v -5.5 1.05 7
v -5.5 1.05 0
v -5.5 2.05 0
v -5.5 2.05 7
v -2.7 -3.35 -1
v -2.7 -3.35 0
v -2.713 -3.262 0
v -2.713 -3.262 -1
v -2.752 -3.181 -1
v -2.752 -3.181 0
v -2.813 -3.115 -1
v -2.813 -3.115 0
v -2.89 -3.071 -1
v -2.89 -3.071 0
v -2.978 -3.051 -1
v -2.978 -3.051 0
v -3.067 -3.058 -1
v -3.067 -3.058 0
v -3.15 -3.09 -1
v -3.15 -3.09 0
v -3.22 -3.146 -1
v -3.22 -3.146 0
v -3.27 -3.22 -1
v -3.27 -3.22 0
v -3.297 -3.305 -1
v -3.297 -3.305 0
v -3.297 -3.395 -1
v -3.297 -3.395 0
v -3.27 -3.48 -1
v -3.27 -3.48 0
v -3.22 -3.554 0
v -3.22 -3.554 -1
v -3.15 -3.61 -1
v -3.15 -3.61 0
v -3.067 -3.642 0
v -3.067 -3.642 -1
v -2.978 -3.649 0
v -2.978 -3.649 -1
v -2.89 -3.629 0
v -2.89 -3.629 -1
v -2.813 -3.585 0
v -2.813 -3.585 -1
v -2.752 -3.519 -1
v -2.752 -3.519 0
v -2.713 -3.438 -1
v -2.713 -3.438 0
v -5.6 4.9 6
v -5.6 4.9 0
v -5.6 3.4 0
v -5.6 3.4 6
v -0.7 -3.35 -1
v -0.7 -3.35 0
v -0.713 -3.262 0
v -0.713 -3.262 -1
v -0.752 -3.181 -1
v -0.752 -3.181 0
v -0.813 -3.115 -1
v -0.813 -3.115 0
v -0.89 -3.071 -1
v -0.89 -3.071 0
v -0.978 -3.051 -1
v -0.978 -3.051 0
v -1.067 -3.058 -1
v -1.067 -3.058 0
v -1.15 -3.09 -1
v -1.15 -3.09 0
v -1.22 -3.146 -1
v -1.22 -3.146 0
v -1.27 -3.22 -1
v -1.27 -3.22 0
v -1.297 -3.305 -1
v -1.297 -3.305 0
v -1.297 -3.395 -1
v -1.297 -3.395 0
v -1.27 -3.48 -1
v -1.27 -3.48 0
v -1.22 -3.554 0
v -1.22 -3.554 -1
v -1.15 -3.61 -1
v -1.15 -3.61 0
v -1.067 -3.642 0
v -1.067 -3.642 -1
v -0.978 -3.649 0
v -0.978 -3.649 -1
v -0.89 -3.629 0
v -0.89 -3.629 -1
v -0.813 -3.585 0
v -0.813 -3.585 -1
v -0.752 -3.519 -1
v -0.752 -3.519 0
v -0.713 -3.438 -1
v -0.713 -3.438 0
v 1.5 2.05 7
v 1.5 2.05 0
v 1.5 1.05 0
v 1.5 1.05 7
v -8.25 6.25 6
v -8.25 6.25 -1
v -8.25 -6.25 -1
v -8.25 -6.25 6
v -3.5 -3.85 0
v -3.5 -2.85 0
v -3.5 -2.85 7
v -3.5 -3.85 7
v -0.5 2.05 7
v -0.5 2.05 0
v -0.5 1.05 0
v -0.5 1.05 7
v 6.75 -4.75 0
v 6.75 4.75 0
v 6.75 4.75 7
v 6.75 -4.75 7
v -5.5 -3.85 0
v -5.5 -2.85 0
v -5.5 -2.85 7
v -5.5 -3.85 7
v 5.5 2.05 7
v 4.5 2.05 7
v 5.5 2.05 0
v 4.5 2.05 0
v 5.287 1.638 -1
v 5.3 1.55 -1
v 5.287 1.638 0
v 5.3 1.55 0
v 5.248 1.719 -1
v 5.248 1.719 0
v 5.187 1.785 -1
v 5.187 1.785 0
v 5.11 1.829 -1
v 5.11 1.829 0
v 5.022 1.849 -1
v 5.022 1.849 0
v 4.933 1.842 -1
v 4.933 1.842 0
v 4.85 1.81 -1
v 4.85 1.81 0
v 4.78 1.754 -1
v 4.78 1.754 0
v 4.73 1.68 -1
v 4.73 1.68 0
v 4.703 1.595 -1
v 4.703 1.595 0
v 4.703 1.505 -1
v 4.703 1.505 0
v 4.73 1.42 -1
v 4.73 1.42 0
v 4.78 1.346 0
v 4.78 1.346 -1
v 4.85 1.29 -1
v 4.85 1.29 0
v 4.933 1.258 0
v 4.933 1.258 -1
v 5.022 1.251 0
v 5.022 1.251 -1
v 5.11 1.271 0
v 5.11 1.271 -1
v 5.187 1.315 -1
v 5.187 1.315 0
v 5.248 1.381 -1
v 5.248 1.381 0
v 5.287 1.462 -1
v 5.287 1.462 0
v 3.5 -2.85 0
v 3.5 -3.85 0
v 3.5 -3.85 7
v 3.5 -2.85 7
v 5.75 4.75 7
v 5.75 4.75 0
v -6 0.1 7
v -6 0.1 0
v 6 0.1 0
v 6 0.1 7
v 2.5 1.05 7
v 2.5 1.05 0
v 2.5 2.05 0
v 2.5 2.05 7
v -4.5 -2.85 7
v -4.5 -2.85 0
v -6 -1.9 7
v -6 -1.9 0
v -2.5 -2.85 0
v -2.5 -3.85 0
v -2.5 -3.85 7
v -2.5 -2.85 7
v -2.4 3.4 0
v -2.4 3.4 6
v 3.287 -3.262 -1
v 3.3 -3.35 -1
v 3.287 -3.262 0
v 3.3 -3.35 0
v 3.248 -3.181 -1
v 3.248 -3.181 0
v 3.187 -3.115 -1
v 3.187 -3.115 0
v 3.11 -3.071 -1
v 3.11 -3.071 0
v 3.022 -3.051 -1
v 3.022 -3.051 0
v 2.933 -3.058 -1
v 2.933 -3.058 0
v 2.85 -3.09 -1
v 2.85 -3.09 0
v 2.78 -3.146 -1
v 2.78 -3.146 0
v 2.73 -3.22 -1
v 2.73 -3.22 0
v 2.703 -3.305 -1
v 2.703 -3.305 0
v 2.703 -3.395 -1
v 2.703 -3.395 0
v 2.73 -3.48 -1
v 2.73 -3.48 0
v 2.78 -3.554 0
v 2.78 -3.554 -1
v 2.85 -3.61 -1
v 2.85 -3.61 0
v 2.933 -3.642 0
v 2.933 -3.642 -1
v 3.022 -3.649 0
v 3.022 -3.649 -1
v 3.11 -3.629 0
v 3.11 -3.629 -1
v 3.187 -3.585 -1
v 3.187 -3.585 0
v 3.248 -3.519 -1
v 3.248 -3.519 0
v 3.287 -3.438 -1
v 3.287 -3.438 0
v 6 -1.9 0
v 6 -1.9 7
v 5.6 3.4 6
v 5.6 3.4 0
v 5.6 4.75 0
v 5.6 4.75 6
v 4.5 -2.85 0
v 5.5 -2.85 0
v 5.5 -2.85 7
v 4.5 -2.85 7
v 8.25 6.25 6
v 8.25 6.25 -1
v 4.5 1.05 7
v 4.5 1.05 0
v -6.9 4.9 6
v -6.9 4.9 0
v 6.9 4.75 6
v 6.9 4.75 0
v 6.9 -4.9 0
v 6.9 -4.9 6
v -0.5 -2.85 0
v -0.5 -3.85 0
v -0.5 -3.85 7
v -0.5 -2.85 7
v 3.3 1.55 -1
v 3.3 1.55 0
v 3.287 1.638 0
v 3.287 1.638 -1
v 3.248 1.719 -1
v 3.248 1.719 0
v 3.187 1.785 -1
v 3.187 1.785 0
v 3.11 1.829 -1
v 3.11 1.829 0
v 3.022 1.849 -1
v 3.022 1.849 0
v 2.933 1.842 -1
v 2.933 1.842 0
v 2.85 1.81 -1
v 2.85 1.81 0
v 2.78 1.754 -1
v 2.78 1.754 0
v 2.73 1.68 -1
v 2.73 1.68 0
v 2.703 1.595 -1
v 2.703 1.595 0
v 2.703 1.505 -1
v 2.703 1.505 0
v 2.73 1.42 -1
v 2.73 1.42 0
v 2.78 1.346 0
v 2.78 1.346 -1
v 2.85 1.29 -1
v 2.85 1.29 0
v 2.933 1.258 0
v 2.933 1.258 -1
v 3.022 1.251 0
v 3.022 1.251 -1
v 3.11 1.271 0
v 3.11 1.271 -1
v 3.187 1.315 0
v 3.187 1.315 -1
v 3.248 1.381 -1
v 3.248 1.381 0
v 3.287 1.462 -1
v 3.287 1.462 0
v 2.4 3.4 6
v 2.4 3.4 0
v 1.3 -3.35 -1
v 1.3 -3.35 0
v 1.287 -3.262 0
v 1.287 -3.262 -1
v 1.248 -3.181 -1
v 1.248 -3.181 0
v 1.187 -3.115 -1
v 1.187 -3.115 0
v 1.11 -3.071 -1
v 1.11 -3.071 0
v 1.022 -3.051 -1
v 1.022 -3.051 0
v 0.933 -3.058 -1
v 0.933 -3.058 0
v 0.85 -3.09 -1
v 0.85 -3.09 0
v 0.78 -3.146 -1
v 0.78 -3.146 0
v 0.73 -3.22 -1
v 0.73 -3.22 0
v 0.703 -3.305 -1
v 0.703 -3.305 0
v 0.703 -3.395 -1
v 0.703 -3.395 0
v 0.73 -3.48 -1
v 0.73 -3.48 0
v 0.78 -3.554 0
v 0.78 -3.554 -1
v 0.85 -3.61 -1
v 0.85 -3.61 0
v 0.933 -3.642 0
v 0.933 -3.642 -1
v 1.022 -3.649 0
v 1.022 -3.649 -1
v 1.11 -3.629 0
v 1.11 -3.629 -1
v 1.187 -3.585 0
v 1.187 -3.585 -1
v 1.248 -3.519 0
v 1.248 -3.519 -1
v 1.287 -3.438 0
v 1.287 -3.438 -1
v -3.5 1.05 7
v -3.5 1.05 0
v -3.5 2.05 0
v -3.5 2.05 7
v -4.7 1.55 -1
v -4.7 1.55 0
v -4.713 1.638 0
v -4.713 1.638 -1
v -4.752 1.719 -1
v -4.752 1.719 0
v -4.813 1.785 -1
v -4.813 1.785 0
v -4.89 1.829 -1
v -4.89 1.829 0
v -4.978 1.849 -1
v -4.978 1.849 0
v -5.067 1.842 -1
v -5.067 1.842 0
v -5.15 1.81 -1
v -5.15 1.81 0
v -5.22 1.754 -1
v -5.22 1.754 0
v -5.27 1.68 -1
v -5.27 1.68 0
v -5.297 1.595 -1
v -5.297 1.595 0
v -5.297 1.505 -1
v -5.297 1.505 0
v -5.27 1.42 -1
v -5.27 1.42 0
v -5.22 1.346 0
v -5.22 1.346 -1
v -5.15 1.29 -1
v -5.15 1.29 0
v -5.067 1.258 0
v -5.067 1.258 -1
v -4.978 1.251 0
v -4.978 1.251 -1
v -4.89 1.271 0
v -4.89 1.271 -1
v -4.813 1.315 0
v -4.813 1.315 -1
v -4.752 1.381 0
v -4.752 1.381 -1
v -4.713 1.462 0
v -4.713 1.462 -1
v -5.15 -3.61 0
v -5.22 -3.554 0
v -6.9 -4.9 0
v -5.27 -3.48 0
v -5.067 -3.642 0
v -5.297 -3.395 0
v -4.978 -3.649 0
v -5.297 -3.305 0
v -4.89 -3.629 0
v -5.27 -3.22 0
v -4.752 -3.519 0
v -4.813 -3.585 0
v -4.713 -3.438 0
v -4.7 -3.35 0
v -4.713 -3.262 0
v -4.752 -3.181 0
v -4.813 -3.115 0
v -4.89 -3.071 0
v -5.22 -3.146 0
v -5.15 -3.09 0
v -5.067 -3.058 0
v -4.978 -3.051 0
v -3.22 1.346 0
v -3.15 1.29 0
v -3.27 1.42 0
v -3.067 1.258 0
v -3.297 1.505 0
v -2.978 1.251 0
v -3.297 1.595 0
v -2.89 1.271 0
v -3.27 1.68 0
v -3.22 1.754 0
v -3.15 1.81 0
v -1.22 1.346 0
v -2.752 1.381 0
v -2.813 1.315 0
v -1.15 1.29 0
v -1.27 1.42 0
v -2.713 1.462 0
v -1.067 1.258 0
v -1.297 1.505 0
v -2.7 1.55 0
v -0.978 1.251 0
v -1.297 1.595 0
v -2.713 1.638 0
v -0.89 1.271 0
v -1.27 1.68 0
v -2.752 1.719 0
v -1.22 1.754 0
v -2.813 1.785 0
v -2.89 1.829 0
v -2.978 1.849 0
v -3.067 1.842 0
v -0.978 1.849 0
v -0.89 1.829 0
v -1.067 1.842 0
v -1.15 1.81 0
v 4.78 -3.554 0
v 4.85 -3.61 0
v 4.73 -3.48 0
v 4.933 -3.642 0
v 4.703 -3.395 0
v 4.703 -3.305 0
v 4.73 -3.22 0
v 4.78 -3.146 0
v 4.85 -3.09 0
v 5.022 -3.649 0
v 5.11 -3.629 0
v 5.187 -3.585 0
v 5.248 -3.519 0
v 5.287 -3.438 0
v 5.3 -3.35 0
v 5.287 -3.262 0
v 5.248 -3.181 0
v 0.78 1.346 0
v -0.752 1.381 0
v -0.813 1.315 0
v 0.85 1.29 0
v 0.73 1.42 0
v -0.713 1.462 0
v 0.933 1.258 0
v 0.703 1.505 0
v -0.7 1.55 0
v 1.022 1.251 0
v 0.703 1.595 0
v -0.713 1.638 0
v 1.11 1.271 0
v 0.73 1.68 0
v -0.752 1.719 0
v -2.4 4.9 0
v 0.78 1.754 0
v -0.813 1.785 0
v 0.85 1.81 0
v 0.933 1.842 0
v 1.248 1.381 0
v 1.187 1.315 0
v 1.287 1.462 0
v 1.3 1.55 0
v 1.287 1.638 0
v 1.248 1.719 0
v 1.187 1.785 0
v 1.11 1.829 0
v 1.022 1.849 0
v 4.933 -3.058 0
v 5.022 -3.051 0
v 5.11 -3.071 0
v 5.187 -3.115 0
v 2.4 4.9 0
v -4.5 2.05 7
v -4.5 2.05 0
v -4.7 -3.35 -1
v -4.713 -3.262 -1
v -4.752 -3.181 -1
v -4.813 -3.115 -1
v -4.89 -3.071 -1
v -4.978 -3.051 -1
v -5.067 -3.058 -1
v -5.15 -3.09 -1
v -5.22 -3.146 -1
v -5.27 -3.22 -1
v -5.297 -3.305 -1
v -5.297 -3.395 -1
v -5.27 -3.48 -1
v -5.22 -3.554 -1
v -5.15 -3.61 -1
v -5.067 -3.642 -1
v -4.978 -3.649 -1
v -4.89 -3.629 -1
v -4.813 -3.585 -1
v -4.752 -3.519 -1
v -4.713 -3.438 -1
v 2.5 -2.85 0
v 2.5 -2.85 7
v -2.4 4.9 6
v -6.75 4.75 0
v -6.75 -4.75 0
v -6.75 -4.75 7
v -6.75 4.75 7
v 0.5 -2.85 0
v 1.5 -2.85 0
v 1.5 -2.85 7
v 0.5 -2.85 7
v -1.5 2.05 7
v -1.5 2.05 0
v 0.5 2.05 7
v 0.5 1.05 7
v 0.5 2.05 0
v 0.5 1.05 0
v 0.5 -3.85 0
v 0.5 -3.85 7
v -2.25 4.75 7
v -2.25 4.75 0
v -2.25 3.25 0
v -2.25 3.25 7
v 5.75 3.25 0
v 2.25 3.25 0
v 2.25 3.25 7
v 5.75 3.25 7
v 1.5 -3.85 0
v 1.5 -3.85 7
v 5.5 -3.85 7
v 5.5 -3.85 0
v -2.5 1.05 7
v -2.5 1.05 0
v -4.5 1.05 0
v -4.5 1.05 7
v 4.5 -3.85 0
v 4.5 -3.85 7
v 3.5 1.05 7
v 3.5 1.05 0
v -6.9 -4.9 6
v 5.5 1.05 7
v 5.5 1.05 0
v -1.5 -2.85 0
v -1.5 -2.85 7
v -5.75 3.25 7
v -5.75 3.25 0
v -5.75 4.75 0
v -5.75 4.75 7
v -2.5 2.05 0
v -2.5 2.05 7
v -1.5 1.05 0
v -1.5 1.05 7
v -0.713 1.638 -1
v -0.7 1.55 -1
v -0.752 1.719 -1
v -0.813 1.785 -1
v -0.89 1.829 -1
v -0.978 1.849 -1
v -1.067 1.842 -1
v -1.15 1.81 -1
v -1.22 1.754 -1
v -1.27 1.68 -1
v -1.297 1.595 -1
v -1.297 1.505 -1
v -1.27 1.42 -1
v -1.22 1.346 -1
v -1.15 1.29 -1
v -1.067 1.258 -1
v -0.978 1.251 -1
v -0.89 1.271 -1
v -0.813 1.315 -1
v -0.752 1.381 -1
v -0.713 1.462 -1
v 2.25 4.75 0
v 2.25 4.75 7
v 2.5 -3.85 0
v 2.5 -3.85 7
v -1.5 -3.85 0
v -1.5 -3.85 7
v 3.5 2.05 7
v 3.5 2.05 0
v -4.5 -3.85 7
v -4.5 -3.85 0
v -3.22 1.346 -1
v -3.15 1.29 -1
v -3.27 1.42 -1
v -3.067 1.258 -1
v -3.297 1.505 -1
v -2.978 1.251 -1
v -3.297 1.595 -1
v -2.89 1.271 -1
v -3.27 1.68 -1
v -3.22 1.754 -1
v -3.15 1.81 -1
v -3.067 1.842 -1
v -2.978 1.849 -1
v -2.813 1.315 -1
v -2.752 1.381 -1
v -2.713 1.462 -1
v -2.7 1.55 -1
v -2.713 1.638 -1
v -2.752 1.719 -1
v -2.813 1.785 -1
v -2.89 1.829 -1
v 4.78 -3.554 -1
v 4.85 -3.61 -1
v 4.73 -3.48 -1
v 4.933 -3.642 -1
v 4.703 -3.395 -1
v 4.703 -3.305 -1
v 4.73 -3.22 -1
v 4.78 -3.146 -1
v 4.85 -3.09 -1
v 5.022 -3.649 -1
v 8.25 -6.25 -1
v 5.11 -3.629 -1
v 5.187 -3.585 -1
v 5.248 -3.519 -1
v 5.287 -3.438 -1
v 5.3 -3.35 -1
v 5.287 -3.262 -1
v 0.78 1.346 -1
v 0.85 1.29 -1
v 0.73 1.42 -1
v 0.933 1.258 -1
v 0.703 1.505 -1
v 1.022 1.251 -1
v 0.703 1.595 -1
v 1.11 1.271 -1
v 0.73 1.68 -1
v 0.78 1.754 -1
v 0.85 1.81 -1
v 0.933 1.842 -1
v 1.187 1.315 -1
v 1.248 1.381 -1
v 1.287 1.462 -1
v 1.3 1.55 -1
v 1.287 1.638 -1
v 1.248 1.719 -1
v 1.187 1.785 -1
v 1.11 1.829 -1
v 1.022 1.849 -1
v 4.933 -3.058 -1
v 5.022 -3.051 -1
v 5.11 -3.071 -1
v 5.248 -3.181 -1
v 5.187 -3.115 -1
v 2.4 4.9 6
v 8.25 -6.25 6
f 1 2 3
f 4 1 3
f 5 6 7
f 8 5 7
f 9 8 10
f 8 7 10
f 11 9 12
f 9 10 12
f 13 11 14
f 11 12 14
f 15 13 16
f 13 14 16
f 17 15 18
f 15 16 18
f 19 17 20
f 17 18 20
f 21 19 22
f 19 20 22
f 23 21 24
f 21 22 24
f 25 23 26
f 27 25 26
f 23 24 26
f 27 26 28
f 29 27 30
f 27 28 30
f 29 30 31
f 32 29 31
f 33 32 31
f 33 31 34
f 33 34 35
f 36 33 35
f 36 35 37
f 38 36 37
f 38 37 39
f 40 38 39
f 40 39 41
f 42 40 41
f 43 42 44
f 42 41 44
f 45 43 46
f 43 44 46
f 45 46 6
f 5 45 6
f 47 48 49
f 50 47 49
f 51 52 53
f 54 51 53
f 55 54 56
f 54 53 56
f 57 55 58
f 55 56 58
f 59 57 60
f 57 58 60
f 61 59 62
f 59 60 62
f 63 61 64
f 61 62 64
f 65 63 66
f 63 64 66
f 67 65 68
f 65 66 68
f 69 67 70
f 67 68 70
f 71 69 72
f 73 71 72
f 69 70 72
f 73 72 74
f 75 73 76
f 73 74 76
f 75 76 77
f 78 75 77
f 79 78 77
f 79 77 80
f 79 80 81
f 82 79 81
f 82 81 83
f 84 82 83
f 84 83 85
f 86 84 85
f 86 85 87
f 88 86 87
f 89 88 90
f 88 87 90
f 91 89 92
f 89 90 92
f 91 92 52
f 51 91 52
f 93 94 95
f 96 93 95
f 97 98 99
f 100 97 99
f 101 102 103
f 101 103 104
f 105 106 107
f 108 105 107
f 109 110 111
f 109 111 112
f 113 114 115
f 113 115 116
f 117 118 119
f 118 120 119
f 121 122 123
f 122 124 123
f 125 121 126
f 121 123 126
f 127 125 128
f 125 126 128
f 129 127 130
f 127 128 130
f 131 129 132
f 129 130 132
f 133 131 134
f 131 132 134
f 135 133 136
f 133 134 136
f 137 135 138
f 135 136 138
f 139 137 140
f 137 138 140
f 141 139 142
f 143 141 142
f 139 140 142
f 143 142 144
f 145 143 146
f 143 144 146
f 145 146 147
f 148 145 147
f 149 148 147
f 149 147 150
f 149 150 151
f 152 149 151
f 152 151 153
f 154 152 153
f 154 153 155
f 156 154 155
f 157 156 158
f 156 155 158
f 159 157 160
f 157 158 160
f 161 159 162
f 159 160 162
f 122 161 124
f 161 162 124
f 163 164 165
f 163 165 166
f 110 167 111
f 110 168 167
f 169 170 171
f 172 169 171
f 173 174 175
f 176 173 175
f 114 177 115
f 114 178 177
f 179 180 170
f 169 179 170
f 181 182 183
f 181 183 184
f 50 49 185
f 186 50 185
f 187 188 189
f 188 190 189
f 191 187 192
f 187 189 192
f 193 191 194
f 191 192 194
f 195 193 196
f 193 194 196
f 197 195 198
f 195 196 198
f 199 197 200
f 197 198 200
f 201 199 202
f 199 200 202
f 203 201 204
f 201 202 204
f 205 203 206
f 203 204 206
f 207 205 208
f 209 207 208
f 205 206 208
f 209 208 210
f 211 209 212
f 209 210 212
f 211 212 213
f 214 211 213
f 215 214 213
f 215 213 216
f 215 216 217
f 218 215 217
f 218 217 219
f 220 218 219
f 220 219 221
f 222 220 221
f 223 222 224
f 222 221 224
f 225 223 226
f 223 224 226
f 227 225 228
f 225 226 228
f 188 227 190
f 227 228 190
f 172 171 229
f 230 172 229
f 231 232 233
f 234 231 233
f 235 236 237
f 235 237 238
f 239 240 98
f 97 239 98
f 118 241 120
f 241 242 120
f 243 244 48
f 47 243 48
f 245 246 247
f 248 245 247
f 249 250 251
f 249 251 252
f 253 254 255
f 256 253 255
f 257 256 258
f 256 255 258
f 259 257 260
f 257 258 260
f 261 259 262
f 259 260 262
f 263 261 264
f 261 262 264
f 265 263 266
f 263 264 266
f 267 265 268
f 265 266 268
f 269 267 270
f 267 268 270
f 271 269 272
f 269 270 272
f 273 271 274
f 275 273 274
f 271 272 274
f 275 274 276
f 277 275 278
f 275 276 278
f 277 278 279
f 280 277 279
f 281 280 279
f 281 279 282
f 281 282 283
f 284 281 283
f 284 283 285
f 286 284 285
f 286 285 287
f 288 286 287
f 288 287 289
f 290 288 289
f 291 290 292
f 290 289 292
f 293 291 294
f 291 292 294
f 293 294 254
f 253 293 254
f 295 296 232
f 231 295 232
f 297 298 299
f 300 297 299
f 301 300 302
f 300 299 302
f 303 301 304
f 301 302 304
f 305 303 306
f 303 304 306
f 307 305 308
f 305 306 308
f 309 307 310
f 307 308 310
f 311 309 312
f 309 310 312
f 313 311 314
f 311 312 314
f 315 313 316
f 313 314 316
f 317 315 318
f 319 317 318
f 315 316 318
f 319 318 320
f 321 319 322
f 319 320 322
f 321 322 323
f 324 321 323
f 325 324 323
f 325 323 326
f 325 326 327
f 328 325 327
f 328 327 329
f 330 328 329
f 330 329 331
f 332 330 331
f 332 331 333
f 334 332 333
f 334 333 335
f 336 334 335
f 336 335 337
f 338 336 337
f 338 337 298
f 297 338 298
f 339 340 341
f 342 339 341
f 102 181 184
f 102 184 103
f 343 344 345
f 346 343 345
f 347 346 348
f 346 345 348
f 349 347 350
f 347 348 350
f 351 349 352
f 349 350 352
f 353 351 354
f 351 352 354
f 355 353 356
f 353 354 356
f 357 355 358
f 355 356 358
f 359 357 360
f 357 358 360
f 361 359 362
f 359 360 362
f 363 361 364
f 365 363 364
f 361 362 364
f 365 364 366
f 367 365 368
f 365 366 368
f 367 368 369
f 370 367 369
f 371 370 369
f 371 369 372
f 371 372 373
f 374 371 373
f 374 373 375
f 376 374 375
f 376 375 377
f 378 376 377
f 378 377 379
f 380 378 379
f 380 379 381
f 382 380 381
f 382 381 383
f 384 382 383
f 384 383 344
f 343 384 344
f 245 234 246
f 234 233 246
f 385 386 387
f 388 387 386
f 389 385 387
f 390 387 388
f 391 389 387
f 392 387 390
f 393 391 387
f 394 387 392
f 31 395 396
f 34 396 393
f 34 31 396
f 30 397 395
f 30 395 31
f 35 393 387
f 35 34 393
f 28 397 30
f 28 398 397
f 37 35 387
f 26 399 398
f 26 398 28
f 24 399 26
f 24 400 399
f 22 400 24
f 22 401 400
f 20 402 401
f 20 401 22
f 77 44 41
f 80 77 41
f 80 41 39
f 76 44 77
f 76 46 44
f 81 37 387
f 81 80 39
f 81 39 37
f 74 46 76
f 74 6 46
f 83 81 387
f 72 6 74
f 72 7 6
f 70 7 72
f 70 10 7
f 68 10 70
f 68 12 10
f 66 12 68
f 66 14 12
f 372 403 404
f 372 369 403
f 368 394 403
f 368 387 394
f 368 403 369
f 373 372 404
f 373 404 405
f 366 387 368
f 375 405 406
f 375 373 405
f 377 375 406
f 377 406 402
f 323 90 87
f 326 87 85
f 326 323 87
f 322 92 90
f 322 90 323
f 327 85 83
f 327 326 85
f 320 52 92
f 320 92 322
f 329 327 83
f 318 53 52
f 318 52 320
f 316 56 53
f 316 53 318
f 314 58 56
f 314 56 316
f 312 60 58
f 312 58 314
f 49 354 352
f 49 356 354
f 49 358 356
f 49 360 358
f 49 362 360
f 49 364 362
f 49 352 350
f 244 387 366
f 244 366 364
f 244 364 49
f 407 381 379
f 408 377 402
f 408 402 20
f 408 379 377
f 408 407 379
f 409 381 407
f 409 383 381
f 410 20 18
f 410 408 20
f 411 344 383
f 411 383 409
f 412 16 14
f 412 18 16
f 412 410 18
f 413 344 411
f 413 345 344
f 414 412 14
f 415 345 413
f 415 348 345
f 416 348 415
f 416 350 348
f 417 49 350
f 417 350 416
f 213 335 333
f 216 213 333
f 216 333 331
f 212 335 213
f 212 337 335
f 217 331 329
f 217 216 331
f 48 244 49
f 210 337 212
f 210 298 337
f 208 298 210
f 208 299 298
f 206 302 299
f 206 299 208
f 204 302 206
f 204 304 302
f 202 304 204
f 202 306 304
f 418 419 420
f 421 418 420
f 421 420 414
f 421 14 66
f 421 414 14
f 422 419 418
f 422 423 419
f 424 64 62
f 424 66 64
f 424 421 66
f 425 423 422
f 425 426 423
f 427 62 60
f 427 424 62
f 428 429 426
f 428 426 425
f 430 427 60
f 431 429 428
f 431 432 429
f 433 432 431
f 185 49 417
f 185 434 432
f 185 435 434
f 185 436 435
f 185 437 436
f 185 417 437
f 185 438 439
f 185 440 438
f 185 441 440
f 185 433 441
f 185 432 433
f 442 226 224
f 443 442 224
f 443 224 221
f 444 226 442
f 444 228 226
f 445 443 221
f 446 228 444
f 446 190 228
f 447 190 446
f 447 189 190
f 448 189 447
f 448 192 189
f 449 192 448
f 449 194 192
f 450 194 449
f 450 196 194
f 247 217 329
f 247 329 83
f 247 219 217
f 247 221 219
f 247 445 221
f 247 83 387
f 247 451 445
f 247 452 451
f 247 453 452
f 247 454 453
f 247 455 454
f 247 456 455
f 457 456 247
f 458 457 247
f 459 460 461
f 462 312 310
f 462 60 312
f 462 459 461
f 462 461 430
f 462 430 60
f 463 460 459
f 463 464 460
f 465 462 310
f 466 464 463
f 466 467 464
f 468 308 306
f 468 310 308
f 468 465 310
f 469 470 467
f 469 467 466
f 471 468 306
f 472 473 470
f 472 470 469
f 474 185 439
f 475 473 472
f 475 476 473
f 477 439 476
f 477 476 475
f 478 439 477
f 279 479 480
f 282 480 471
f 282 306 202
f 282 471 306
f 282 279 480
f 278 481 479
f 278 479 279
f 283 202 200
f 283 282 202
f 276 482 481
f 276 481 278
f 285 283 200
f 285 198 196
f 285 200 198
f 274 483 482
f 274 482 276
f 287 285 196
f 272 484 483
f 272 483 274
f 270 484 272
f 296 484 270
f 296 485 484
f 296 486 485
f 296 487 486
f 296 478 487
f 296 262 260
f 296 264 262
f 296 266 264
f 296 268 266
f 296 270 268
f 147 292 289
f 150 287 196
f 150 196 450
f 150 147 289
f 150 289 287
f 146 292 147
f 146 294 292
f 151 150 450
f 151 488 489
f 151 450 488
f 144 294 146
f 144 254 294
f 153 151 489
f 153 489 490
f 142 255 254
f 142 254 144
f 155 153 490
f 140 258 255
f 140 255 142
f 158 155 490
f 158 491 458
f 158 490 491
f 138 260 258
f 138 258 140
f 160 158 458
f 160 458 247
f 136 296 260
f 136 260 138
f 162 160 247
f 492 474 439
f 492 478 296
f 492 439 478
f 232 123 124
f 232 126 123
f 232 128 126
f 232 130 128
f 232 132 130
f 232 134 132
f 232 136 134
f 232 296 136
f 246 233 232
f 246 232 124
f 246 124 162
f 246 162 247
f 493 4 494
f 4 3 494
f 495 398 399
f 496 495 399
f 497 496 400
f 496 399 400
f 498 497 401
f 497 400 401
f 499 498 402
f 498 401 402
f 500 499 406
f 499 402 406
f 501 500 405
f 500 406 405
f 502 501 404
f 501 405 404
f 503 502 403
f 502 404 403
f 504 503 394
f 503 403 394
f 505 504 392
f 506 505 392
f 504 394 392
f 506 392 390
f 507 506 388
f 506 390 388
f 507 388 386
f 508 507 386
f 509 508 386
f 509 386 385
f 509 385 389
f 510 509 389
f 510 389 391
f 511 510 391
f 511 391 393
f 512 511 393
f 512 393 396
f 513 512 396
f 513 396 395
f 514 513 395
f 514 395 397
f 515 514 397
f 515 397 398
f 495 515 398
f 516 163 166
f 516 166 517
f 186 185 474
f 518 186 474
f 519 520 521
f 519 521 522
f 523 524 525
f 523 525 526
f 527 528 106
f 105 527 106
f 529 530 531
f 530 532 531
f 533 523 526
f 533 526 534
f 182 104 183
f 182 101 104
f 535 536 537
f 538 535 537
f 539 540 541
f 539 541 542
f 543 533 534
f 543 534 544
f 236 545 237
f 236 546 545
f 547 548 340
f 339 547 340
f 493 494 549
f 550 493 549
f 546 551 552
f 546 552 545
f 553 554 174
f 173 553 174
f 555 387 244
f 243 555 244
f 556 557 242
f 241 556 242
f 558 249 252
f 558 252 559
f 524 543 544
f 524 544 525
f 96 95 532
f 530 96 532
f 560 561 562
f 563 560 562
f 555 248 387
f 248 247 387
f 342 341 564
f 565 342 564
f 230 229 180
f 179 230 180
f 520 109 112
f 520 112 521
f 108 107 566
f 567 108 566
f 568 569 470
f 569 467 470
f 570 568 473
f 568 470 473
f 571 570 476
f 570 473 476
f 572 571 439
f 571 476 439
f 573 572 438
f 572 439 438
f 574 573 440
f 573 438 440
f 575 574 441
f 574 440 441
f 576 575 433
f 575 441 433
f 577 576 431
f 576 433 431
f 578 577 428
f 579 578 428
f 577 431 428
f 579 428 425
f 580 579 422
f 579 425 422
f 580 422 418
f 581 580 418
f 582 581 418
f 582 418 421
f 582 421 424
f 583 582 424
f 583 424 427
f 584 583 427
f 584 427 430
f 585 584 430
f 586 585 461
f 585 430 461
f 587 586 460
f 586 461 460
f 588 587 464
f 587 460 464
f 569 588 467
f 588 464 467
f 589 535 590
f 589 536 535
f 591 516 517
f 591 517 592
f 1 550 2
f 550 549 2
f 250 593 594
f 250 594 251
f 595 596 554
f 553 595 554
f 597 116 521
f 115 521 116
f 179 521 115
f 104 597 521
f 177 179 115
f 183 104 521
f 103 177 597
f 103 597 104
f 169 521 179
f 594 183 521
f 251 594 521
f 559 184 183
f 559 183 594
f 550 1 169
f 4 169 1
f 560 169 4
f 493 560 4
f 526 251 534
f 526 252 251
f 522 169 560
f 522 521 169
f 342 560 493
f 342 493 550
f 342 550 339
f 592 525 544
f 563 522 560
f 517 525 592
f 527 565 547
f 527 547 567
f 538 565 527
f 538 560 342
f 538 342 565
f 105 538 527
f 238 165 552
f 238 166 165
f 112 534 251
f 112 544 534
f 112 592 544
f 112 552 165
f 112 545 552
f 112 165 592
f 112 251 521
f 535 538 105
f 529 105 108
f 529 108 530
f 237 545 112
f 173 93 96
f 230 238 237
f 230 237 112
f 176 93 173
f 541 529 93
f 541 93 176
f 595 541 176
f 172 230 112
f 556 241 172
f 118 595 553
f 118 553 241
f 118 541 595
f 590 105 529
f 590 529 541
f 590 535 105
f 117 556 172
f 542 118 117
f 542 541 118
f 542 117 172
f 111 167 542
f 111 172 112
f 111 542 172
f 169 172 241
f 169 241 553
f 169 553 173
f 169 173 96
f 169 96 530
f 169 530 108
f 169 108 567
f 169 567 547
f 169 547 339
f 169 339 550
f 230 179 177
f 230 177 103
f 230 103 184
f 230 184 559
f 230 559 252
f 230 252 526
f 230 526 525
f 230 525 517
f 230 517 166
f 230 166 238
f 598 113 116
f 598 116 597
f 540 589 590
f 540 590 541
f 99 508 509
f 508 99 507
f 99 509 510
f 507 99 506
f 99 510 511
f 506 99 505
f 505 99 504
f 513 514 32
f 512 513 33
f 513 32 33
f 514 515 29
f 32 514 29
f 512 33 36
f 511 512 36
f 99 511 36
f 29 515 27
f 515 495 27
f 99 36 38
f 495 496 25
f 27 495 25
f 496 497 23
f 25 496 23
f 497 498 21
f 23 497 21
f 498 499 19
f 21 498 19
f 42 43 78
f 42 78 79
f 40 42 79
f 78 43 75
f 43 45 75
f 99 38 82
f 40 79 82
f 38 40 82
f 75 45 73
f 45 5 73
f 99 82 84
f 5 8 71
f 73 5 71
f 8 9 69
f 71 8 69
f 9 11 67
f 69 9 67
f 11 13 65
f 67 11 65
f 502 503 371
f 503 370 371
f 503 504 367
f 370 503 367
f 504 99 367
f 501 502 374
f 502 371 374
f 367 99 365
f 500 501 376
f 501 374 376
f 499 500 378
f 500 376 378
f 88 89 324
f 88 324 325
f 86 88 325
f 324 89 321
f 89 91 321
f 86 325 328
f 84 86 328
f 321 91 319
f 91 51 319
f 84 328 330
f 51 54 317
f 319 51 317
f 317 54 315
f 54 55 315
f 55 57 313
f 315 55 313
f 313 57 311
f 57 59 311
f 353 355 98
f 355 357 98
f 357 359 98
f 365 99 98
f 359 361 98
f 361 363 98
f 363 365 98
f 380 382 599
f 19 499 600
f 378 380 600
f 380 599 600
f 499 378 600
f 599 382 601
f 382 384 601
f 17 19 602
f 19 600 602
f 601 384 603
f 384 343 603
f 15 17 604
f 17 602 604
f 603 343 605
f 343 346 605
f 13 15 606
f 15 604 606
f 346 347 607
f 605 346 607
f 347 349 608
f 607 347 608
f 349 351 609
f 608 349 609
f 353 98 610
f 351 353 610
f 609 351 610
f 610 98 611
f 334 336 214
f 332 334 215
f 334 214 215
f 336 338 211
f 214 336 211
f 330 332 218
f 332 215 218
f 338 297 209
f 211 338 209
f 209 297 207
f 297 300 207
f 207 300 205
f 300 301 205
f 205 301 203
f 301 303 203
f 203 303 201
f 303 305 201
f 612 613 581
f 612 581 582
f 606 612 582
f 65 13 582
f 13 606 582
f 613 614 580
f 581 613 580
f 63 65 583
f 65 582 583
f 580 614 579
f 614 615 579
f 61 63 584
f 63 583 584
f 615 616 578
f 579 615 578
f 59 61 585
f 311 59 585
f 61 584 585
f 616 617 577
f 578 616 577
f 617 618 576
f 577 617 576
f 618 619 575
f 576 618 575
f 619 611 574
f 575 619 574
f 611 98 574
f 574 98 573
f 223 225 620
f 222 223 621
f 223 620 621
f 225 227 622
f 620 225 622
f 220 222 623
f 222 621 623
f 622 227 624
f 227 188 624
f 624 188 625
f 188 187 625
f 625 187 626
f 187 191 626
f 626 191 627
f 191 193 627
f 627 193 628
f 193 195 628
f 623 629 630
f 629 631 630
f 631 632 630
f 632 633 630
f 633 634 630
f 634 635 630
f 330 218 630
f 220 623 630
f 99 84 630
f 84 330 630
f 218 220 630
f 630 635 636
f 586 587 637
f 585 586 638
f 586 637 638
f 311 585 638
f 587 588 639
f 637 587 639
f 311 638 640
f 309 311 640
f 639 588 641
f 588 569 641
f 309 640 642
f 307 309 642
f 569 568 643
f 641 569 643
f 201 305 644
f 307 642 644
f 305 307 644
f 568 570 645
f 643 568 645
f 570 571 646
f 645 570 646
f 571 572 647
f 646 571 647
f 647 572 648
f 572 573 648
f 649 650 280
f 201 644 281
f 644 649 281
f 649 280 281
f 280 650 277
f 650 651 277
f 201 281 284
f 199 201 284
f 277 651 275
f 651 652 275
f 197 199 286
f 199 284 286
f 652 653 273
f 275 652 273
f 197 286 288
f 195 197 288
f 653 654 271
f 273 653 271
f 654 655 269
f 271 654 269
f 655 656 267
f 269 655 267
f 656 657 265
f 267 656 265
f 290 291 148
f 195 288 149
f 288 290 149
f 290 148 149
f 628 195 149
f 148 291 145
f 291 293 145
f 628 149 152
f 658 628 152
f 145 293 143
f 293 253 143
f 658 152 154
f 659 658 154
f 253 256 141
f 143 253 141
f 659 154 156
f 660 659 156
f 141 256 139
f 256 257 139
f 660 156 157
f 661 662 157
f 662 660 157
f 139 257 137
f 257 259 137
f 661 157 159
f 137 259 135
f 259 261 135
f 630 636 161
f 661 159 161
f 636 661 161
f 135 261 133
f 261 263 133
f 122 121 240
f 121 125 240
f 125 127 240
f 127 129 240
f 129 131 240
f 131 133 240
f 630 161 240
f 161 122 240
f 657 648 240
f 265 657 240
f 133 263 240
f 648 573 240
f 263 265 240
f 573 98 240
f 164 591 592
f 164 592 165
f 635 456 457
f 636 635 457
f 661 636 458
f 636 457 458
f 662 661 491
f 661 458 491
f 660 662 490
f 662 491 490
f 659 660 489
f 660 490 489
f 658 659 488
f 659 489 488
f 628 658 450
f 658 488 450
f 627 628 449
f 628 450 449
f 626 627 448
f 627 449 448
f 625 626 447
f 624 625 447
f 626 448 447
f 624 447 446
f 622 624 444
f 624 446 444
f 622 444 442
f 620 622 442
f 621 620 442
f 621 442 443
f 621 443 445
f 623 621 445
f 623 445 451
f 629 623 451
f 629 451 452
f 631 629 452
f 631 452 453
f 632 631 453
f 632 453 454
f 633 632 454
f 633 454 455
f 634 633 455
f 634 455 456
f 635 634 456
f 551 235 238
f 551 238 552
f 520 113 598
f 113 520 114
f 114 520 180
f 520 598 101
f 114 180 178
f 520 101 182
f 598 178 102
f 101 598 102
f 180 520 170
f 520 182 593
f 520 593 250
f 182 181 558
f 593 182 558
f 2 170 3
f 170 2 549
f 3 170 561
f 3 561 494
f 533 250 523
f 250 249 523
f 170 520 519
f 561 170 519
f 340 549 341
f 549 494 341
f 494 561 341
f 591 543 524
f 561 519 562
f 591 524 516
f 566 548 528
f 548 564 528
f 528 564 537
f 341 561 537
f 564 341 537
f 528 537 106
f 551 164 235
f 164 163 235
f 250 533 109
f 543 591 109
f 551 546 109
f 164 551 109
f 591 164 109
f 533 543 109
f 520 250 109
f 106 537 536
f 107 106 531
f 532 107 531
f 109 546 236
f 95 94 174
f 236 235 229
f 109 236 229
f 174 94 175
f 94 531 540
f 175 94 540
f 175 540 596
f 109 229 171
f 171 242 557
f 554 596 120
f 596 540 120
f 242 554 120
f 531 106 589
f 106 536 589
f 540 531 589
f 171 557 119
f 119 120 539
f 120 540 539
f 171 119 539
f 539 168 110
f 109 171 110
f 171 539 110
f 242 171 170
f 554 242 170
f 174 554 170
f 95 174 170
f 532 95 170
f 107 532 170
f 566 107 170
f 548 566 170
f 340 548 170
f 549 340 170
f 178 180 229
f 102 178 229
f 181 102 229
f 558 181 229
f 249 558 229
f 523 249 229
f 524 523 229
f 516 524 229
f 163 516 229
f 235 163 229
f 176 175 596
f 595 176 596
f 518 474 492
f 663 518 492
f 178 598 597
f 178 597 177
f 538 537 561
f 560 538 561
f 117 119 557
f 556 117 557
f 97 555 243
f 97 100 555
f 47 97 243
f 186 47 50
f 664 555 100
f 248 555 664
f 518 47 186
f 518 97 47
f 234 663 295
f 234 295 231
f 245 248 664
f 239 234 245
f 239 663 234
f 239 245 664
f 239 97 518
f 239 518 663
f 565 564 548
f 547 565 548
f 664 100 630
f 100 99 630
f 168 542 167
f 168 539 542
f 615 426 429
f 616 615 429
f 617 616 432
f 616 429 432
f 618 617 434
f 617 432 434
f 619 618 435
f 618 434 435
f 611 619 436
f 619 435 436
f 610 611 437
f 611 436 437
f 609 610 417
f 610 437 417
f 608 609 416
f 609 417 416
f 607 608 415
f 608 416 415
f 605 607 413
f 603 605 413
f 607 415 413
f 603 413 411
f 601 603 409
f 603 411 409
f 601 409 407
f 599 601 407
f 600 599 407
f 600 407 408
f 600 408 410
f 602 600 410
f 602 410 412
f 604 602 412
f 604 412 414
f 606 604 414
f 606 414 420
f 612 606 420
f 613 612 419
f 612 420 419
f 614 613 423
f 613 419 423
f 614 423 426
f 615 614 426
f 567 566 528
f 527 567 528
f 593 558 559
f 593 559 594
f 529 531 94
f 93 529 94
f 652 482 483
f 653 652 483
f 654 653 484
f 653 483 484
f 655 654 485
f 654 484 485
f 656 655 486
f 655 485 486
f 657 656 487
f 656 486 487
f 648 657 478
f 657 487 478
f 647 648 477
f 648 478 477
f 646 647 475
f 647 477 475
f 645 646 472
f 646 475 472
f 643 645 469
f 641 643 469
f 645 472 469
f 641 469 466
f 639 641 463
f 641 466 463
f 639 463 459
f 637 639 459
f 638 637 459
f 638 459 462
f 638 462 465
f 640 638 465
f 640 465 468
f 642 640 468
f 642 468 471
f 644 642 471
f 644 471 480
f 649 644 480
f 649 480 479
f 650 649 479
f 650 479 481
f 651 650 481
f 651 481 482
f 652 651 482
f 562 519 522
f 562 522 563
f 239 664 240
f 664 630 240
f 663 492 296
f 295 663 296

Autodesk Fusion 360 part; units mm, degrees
sketch "Sketch1" plane through (0, 0, 0) normal (0, 0, 1) x (1, 0, 0) in component "Connector"
  line L0 (6.75, -4.75) -> (-6.75, -4.75)
  line L1 (-6.75, -4.75) -> (-6.75, 4.75)
  line L2 (-6.75, 4.75) -> (6.75, 4.75)
  line L3 (6.75, 4.75) -> (6.75, -4.75)
  line L4 (6.75, -4.75) -> (-6.75, 4.75) construction
  line L5 (-6.75, -4.75) -> (6.75, 4.75) construction
  line L6 (-5.75, 4.75) -> (-2.25, 4.75)
  line L7 (-2.25, 4.75) -> (-2.25, 3.25)
  line L8 (-2.25, 3.25) -> (-5.75, 3.25)
  line L9 (-5.75, 3.25) -> (-5.75, 4.75)
  line L10 (0, 0) -> (0, 4.75) construction
  line L11 (2.25, 3.25) -> (5.75, 3.25)
  line L12 (2.25, 4.75) -> (2.25, 3.25)
  line L13 (5.75, 3.25) -> (5.75, 4.75)
  line L14 (5.75, 4.75) -> (2.25, 4.75)
  line L15 (0, -4.75) -> (0, -0.9) construction
  line L16 (6, -1.9) -> (-6, -1.9)
  line L17 (-6, -1.9) -> (-6, 0.1)
  line L18 (-6, 0.1) -> (6, 0.1)
  line L19 (6, 0.1) -> (6, -1.9)
  line L20 (6, -1.9) -> (-6, 0.1) construction
  line L21 (-6, -1.9) -> (6, 0.1) construction
  line L22 (-5.5, -3.85) -> (-4.5, -3.85)
  line L23 (-4.5, -3.85) -> (-4.5, -2.85)
  line L24 (-4.5, -2.85) -> (-5.5, -2.85)
  line L25 (-5.5, -2.85) -> (-5.5, -3.85)
  line L26 (-3.5, -3.85) -> (-2.5, -3.85)
  line L27 (-2.5, -3.85) -> (-2.5, -2.85)
  line L28 (-2.5, -2.85) -> (-3.5, -2.85)
  line L29 (-3.5, -2.85) -> (-3.5, -3.85)
  line L30 (-1.5, -3.85) -> (-0.5, -3.85)
  line L31 (-0.5, -3.85) -> (-0.5, -2.85)
  line L32 (-0.5, -2.85) -> (-1.5, -2.85)
  line L33 (-1.5, -2.85) -> (-1.5, -3.85)
  line L34 (0.5, -3.85) -> (1.5, -3.85)
  line L35 (1.5, -3.85) -> (1.5, -2.85)
  line L36 (1.5, -2.85) -> (0.5, -2.85)
  line L37 (0.5, -2.85) -> (0.5, -3.85)
  line L38 (2.5, -3.85) -> (3.5, -3.85)
  line L39 (3.5, -3.85) -> (3.5, -2.85)
  line L40 (3.5, -2.85) -> (2.5, -2.85)
  line L41 (2.5, -2.85) -> (2.5, -3.85)
  line L42 (4.5, -3.85) -> (5.5, -3.85)
  line L43 (5.5, -3.85) -> (5.5, -2.85)
  line L44 (5.5, -2.85) -> (4.5, -2.85)
  line L45 (4.5, -2.85) -> (4.5, -3.85)
  line L46 (-5.5, -3.85) -> (-6.75, -3.85) construction
  line L47 (5.5, -3.85) -> (6.75, -3.85) construction
  line L48 (0, -0.9) -> (6, -0.9) construction
  line L49 (-1.5, 1.05) -> (-1.5, 2.05)
  line L50 (4.5, 1.05) -> (4.5, 2.05)
  line L51 (1.5, 2.05) -> (1.5, 1.05)
  line L52 (-0.5, 2.05) -> (-0.5, 1.05)
  line L53 (-3.5, 2.05) -> (-2.5, 2.05)
  line L54 (-2.5, 1.05) -> (-3.5, 1.05)
  line L55 (-2.5, 2.05) -> (-2.5, 1.05)
  line L56 (3.5, 1.05) -> (2.5, 1.05)
  line L57 (1.5, 1.05) -> (0.5, 1.05)
  line L58 (-4.5, 2.05) -> (-4.5, 1.05)
  line L59 (0.5, 1.05) -> (0.5, 2.05)
  line L60 (3.5, 2.05) -> (3.5, 1.05)
  line L61 (-1.5, 2.05) -> (-0.5, 2.05)
  line L62 (-5.5, 2.05) -> (-4.5, 2.05)
  line L63 (5.5, 2.05) -> (5.5, 1.05)
  line L64 (-0.5, 1.05) -> (-1.5, 1.05)
  line L65 (2.5, 1.05) -> (2.5, 2.05)
  line L66 (4.5, 2.05) -> (5.5, 2.05)
  line L67 (-3.5, 1.05) -> (-3.5, 2.05)
  line L68 (5.5, 1.05) -> (4.5, 1.05)
  line L69 (0.5, 2.05) -> (1.5, 2.05)
  line L70 (-4.5, 1.05) -> (-5.5, 1.05)
  line L71 (-5.5, 1.05) -> (-5.5, 2.05)
  line L72 (2.5, 2.05) -> (3.5, 2.05)
  point P0 (0, -0.9)
  dimension "d1" = 13.5
  dimension "d2" = 9.5
  dimension "d3" = 3.5
  dimension "d4" = 1.5
  dimension "d5" = 1
  dimension "d6" = 3.85
  dimension "d7" = 12
  dimension "d8" = 2
  dimension "d9" = 1
  dimension "d10" = 1
  dimension "d11" = 0.9
  dimension "d15" = 2
  dimension "d16" = 0
extrude "Extrude1" add sketch "Sketch1" along normal blind 7 contours L0 L1 L2 L3 L7 L8 L9 L11 L12 L13 makes body 1 in component "Connector"
sketch "Sketch1 (2)" plane through (0, 0, 0) normal (0, 0, 1) x (1, 0, 0) in component "Socket"
  line L0 (4.5, -2.85) -> (4.5, -3.85) construction
  line L1 (4.5, -3.85) -> (5.5, -3.85) construction
  line L2 (5.5, -3.85) -> (5.5, -2.85) construction
  line L3 (5.5, -2.85) -> (4.5, -2.85) construction
  line L4 (0.5, -2.85) -> (0.5, -3.85) construction
  line L5 (0.5, -3.85) -> (1.5, -3.85) construction
  line L6 (1.5, -3.85) -> (1.5, -2.85) construction
  line L7 (1.5, -2.85) -> (0.5, -2.85) construction
  line L8 (-5.5, -2.85) -> (-5.5, -3.85) construction
  line L9 (-5.5, -3.85) -> (-4.5, -3.85) construction
  line L10 (-4.5, -3.85) -> (-4.5, -2.85) construction
  line L11 (-4.5, -2.85) -> (-5.5, -2.85) construction
  line L12 (-5.5, 1.05) -> (-4.5, 1.05) construction
  line L13 (-4.5, 1.05) -> (-4.5, 2.05) construction
  line L14 (-4.5, 2.05) -> (-5.5, 2.05) construction
  line L15 (-5.5, 2.05) -> (-5.5, 1.05) construction
  line L16 (2.5, 2.05) -> (2.5, 1.05) construction
  line L17 (2.5, 1.05) -> (3.5, 1.05) construction
  line L18 (3.5, 1.05) -> (3.5, 2.05) construction
  line L19 (3.5, 2.05) -> (2.5, 2.05) construction
  line L20 (0.5, 2.05) -> (0.5, 1.05) construction
  line L21 (0.5, 1.05) -> (1.5, 1.05) construction
  line L22 (1.5, 1.05) -> (1.5, 2.05) construction
  line L23 (1.5, 2.05) -> (0.5, 2.05) construction
  line L24 (5.5, 1.05) -> (5.5, 2.05) construction
  line L25 (5.5, 2.05) -> (4.5, 2.05) construction
  line L26 (4.5, 2.05) -> (4.5, 1.05) construction
  line L27 (4.5, 1.05) -> (5.5, 1.05) construction
  line L28 (-0.5, 1.05) -> (-0.5, 2.05) construction
  line L29 (-0.5, 2.05) -> (-1.5, 2.05) construction
  line L30 (-1.5, 2.05) -> (-1.5, 1.05) construction
  line L31 (-1.5, 1.05) -> (-0.5, 1.05) construction
  line L32 (-3.5, 1.05) -> (-2.5, 1.05) construction
  line L33 (-2.5, 1.05) -> (-2.5, 2.05) construction
  line L34 (-2.5, 2.05) -> (-3.5, 2.05) construction
  line L35 (-3.5, 2.05) -> (-3.5, 1.05) construction
  line L36 (-1.5, -2.85) -> (-1.5, -3.85) construction
  line L37 (-1.5, -3.85) -> (-0.5, -3.85) construction
  line L38 (-0.5, -3.85) -> (-0.5, -2.85) construction
  line L39 (-0.5, -2.85) -> (-1.5, -2.85) construction
  line L40 (2.5, -2.85) -> (2.5, -3.85) construction
  line L41 (2.5, -3.85) -> (3.5, -3.85) construction
  line L42 (3.5, -3.85) -> (3.5, -2.85) construction
  line L43 (3.5, -2.85) -> (2.5, -2.85) construction
  line L44 (-3.5, -2.85) -> (-3.5, -3.85) construction
  line L45 (-3.5, -3.85) -> (-2.5, -3.85) construction
  line L46 (-2.5, -3.85) -> (-2.5, -2.85) construction
  line L47 (-2.5, -2.85) -> (-3.5, -2.85) construction
  line L48 (6, 0.1) -> (-6, 0.1) construction
  line L49 (-6, 0.1) -> (-6, -1.9) construction
  line L50 (-6, -1.9) -> (6, -1.9) construction
  line L51 (6, -1.9) -> (6, 0.1) construction
  line L52 (-2.25, 3.25) -> (-2.25, 4.75)
  line L53 (-2.25, 4.75) -> (2.25, 4.75)
  line L54 (2.25, 4.75) -> (2.25, 3.25)
  line L55 (2.25, 3.25) -> (5.75, 3.25)
  line L56 (5.75, 3.25) -> (5.75, 4.75)
  line L57 (5.75, 4.75) -> (6.75, 4.75)
  line L58 (6.75, 4.75) -> (6.75, -4.75)
  line L59 (6.75, -4.75) -> (-6.75, -4.75)
  line L60 (-6.75, -4.75) -> (-6.75, 4.75)
  line L61 (-6.75, 4.75) -> (-5.75, 4.75)
  line L62 (-5.75, 4.75) -> (-5.75, 3.25)
  line L63 (-5.75, 3.25) -> (-2.25, 3.25)
  line L64 (-8.25, -6.25) -> (8.25, -6.25)
  line L65 (8.25, -6.25) -> (8.25, 6.25)
  line L66 (8.25, 6.25) -> (-8.25, 6.25)
  line L67 (-8.25, 6.25) -> (-8.25, -6.25)
  line L68 (-8.25, -6.25) -> (8.25, 6.25) construction
  line L69 (8.25, -6.25) -> (-8.25, 6.25) construction
  line L70 (5.5, 1.05) -> (4.5, 2.05) construction
  line L71 (5.5, -3.85) -> (4.5, -2.85) construction
  line L72 (3.5, -3.85) -> (2.5, -2.85) construction
  line L73 (1.5, -3.85) -> (0.5, -2.85) construction
  line L74 (3.5, 1.05) -> (2.5, 2.05) construction
  line L75 (1.5, 1.05) -> (0.5, 2.05) construction
  line L76 (-0.5, 1.05) -> (-1.5, 2.05) construction
  line L77 (-2.5, 1.05) -> (-3.5, 2.05) construction
  line L78 (-4.5, 1.05) -> (-5.5, 2.05) construction
  line L79 (-4.5, -3.85) -> (-5.5, -2.85) construction
  line L80 (-2.5, -3.85) -> (-3.5, -2.85) construction
  line L81 (-0.5, -3.85) -> (-1.5, -2.85) construction
  circle A0 centre (5, 1.55) radius 0.3
  circle A1 centre (3, 1.55) radius 0.3
  circle A2 centre (1, 1.55) radius 0.3
  circle A3 centre (-1, 1.55) radius 0.3
  circle A4 centre (-3, 1.55) radius 0.3
  circle A5 centre (-5, 1.55) radius 0.3
  circle A6 centre (-5, -3.35) radius 0.3
  circle A7 centre (-3, -3.35) radius 0.3
  circle A8 centre (-1, -3.35) radius 0.3
  circle A9 centre (1, -3.35) radius 0.3
  circle A10 centre (3, -3.35) radius 0.3
  circle A11 centre (5, -3.35) radius 0.3
  dimension "d19" = 1.5
  dimension "d20" = 1.5
  dimension "d21" = 0.6
extrude "Extrude1'" add sketch "Sketch1 (2)" along normal blind 6 separate body contours L64 L65 L66 L67 makes body 2 in component "Socket"
extrude "Extrude2" add sketch "Sketch1 (2)" against normal blind 1 contours L52 L53 L54 L55 L56 L57 L58 L59 L60 L61 L62 L63 | L64 L65 L66 L67 bodies 2 in component "Socket"
move_face "OffsetFaces1" offset -0.15 11 faces at (-0.75, 4.75, 2) (-2.25, 4.25, 4) (-4.5833, 3.25, 2) (-6.4167, 4.75, 2) (-6.75, -1.5833, 2) (3.4167, 3.25, 2) (5.75, 4.25, 4) (2.25, 4.25, 2) (-5.75, 4.25, 2) (6.75, 1.5833, 2) (2.25, -4.75, 2) on bodies 2 in component "Socket"
component "Connector" placed x (1, 0, 0) y (0, 1, 0) z (0, 0, 1) at (0, 0, 0)
component "Socket" placed x (1, 0, 0) y (0, 1, 0) z (0, 0, 1) at (0, 0, 0)
equation "d6 = 2.85 mm + d8 / 2"
equation "d20 = d19"
